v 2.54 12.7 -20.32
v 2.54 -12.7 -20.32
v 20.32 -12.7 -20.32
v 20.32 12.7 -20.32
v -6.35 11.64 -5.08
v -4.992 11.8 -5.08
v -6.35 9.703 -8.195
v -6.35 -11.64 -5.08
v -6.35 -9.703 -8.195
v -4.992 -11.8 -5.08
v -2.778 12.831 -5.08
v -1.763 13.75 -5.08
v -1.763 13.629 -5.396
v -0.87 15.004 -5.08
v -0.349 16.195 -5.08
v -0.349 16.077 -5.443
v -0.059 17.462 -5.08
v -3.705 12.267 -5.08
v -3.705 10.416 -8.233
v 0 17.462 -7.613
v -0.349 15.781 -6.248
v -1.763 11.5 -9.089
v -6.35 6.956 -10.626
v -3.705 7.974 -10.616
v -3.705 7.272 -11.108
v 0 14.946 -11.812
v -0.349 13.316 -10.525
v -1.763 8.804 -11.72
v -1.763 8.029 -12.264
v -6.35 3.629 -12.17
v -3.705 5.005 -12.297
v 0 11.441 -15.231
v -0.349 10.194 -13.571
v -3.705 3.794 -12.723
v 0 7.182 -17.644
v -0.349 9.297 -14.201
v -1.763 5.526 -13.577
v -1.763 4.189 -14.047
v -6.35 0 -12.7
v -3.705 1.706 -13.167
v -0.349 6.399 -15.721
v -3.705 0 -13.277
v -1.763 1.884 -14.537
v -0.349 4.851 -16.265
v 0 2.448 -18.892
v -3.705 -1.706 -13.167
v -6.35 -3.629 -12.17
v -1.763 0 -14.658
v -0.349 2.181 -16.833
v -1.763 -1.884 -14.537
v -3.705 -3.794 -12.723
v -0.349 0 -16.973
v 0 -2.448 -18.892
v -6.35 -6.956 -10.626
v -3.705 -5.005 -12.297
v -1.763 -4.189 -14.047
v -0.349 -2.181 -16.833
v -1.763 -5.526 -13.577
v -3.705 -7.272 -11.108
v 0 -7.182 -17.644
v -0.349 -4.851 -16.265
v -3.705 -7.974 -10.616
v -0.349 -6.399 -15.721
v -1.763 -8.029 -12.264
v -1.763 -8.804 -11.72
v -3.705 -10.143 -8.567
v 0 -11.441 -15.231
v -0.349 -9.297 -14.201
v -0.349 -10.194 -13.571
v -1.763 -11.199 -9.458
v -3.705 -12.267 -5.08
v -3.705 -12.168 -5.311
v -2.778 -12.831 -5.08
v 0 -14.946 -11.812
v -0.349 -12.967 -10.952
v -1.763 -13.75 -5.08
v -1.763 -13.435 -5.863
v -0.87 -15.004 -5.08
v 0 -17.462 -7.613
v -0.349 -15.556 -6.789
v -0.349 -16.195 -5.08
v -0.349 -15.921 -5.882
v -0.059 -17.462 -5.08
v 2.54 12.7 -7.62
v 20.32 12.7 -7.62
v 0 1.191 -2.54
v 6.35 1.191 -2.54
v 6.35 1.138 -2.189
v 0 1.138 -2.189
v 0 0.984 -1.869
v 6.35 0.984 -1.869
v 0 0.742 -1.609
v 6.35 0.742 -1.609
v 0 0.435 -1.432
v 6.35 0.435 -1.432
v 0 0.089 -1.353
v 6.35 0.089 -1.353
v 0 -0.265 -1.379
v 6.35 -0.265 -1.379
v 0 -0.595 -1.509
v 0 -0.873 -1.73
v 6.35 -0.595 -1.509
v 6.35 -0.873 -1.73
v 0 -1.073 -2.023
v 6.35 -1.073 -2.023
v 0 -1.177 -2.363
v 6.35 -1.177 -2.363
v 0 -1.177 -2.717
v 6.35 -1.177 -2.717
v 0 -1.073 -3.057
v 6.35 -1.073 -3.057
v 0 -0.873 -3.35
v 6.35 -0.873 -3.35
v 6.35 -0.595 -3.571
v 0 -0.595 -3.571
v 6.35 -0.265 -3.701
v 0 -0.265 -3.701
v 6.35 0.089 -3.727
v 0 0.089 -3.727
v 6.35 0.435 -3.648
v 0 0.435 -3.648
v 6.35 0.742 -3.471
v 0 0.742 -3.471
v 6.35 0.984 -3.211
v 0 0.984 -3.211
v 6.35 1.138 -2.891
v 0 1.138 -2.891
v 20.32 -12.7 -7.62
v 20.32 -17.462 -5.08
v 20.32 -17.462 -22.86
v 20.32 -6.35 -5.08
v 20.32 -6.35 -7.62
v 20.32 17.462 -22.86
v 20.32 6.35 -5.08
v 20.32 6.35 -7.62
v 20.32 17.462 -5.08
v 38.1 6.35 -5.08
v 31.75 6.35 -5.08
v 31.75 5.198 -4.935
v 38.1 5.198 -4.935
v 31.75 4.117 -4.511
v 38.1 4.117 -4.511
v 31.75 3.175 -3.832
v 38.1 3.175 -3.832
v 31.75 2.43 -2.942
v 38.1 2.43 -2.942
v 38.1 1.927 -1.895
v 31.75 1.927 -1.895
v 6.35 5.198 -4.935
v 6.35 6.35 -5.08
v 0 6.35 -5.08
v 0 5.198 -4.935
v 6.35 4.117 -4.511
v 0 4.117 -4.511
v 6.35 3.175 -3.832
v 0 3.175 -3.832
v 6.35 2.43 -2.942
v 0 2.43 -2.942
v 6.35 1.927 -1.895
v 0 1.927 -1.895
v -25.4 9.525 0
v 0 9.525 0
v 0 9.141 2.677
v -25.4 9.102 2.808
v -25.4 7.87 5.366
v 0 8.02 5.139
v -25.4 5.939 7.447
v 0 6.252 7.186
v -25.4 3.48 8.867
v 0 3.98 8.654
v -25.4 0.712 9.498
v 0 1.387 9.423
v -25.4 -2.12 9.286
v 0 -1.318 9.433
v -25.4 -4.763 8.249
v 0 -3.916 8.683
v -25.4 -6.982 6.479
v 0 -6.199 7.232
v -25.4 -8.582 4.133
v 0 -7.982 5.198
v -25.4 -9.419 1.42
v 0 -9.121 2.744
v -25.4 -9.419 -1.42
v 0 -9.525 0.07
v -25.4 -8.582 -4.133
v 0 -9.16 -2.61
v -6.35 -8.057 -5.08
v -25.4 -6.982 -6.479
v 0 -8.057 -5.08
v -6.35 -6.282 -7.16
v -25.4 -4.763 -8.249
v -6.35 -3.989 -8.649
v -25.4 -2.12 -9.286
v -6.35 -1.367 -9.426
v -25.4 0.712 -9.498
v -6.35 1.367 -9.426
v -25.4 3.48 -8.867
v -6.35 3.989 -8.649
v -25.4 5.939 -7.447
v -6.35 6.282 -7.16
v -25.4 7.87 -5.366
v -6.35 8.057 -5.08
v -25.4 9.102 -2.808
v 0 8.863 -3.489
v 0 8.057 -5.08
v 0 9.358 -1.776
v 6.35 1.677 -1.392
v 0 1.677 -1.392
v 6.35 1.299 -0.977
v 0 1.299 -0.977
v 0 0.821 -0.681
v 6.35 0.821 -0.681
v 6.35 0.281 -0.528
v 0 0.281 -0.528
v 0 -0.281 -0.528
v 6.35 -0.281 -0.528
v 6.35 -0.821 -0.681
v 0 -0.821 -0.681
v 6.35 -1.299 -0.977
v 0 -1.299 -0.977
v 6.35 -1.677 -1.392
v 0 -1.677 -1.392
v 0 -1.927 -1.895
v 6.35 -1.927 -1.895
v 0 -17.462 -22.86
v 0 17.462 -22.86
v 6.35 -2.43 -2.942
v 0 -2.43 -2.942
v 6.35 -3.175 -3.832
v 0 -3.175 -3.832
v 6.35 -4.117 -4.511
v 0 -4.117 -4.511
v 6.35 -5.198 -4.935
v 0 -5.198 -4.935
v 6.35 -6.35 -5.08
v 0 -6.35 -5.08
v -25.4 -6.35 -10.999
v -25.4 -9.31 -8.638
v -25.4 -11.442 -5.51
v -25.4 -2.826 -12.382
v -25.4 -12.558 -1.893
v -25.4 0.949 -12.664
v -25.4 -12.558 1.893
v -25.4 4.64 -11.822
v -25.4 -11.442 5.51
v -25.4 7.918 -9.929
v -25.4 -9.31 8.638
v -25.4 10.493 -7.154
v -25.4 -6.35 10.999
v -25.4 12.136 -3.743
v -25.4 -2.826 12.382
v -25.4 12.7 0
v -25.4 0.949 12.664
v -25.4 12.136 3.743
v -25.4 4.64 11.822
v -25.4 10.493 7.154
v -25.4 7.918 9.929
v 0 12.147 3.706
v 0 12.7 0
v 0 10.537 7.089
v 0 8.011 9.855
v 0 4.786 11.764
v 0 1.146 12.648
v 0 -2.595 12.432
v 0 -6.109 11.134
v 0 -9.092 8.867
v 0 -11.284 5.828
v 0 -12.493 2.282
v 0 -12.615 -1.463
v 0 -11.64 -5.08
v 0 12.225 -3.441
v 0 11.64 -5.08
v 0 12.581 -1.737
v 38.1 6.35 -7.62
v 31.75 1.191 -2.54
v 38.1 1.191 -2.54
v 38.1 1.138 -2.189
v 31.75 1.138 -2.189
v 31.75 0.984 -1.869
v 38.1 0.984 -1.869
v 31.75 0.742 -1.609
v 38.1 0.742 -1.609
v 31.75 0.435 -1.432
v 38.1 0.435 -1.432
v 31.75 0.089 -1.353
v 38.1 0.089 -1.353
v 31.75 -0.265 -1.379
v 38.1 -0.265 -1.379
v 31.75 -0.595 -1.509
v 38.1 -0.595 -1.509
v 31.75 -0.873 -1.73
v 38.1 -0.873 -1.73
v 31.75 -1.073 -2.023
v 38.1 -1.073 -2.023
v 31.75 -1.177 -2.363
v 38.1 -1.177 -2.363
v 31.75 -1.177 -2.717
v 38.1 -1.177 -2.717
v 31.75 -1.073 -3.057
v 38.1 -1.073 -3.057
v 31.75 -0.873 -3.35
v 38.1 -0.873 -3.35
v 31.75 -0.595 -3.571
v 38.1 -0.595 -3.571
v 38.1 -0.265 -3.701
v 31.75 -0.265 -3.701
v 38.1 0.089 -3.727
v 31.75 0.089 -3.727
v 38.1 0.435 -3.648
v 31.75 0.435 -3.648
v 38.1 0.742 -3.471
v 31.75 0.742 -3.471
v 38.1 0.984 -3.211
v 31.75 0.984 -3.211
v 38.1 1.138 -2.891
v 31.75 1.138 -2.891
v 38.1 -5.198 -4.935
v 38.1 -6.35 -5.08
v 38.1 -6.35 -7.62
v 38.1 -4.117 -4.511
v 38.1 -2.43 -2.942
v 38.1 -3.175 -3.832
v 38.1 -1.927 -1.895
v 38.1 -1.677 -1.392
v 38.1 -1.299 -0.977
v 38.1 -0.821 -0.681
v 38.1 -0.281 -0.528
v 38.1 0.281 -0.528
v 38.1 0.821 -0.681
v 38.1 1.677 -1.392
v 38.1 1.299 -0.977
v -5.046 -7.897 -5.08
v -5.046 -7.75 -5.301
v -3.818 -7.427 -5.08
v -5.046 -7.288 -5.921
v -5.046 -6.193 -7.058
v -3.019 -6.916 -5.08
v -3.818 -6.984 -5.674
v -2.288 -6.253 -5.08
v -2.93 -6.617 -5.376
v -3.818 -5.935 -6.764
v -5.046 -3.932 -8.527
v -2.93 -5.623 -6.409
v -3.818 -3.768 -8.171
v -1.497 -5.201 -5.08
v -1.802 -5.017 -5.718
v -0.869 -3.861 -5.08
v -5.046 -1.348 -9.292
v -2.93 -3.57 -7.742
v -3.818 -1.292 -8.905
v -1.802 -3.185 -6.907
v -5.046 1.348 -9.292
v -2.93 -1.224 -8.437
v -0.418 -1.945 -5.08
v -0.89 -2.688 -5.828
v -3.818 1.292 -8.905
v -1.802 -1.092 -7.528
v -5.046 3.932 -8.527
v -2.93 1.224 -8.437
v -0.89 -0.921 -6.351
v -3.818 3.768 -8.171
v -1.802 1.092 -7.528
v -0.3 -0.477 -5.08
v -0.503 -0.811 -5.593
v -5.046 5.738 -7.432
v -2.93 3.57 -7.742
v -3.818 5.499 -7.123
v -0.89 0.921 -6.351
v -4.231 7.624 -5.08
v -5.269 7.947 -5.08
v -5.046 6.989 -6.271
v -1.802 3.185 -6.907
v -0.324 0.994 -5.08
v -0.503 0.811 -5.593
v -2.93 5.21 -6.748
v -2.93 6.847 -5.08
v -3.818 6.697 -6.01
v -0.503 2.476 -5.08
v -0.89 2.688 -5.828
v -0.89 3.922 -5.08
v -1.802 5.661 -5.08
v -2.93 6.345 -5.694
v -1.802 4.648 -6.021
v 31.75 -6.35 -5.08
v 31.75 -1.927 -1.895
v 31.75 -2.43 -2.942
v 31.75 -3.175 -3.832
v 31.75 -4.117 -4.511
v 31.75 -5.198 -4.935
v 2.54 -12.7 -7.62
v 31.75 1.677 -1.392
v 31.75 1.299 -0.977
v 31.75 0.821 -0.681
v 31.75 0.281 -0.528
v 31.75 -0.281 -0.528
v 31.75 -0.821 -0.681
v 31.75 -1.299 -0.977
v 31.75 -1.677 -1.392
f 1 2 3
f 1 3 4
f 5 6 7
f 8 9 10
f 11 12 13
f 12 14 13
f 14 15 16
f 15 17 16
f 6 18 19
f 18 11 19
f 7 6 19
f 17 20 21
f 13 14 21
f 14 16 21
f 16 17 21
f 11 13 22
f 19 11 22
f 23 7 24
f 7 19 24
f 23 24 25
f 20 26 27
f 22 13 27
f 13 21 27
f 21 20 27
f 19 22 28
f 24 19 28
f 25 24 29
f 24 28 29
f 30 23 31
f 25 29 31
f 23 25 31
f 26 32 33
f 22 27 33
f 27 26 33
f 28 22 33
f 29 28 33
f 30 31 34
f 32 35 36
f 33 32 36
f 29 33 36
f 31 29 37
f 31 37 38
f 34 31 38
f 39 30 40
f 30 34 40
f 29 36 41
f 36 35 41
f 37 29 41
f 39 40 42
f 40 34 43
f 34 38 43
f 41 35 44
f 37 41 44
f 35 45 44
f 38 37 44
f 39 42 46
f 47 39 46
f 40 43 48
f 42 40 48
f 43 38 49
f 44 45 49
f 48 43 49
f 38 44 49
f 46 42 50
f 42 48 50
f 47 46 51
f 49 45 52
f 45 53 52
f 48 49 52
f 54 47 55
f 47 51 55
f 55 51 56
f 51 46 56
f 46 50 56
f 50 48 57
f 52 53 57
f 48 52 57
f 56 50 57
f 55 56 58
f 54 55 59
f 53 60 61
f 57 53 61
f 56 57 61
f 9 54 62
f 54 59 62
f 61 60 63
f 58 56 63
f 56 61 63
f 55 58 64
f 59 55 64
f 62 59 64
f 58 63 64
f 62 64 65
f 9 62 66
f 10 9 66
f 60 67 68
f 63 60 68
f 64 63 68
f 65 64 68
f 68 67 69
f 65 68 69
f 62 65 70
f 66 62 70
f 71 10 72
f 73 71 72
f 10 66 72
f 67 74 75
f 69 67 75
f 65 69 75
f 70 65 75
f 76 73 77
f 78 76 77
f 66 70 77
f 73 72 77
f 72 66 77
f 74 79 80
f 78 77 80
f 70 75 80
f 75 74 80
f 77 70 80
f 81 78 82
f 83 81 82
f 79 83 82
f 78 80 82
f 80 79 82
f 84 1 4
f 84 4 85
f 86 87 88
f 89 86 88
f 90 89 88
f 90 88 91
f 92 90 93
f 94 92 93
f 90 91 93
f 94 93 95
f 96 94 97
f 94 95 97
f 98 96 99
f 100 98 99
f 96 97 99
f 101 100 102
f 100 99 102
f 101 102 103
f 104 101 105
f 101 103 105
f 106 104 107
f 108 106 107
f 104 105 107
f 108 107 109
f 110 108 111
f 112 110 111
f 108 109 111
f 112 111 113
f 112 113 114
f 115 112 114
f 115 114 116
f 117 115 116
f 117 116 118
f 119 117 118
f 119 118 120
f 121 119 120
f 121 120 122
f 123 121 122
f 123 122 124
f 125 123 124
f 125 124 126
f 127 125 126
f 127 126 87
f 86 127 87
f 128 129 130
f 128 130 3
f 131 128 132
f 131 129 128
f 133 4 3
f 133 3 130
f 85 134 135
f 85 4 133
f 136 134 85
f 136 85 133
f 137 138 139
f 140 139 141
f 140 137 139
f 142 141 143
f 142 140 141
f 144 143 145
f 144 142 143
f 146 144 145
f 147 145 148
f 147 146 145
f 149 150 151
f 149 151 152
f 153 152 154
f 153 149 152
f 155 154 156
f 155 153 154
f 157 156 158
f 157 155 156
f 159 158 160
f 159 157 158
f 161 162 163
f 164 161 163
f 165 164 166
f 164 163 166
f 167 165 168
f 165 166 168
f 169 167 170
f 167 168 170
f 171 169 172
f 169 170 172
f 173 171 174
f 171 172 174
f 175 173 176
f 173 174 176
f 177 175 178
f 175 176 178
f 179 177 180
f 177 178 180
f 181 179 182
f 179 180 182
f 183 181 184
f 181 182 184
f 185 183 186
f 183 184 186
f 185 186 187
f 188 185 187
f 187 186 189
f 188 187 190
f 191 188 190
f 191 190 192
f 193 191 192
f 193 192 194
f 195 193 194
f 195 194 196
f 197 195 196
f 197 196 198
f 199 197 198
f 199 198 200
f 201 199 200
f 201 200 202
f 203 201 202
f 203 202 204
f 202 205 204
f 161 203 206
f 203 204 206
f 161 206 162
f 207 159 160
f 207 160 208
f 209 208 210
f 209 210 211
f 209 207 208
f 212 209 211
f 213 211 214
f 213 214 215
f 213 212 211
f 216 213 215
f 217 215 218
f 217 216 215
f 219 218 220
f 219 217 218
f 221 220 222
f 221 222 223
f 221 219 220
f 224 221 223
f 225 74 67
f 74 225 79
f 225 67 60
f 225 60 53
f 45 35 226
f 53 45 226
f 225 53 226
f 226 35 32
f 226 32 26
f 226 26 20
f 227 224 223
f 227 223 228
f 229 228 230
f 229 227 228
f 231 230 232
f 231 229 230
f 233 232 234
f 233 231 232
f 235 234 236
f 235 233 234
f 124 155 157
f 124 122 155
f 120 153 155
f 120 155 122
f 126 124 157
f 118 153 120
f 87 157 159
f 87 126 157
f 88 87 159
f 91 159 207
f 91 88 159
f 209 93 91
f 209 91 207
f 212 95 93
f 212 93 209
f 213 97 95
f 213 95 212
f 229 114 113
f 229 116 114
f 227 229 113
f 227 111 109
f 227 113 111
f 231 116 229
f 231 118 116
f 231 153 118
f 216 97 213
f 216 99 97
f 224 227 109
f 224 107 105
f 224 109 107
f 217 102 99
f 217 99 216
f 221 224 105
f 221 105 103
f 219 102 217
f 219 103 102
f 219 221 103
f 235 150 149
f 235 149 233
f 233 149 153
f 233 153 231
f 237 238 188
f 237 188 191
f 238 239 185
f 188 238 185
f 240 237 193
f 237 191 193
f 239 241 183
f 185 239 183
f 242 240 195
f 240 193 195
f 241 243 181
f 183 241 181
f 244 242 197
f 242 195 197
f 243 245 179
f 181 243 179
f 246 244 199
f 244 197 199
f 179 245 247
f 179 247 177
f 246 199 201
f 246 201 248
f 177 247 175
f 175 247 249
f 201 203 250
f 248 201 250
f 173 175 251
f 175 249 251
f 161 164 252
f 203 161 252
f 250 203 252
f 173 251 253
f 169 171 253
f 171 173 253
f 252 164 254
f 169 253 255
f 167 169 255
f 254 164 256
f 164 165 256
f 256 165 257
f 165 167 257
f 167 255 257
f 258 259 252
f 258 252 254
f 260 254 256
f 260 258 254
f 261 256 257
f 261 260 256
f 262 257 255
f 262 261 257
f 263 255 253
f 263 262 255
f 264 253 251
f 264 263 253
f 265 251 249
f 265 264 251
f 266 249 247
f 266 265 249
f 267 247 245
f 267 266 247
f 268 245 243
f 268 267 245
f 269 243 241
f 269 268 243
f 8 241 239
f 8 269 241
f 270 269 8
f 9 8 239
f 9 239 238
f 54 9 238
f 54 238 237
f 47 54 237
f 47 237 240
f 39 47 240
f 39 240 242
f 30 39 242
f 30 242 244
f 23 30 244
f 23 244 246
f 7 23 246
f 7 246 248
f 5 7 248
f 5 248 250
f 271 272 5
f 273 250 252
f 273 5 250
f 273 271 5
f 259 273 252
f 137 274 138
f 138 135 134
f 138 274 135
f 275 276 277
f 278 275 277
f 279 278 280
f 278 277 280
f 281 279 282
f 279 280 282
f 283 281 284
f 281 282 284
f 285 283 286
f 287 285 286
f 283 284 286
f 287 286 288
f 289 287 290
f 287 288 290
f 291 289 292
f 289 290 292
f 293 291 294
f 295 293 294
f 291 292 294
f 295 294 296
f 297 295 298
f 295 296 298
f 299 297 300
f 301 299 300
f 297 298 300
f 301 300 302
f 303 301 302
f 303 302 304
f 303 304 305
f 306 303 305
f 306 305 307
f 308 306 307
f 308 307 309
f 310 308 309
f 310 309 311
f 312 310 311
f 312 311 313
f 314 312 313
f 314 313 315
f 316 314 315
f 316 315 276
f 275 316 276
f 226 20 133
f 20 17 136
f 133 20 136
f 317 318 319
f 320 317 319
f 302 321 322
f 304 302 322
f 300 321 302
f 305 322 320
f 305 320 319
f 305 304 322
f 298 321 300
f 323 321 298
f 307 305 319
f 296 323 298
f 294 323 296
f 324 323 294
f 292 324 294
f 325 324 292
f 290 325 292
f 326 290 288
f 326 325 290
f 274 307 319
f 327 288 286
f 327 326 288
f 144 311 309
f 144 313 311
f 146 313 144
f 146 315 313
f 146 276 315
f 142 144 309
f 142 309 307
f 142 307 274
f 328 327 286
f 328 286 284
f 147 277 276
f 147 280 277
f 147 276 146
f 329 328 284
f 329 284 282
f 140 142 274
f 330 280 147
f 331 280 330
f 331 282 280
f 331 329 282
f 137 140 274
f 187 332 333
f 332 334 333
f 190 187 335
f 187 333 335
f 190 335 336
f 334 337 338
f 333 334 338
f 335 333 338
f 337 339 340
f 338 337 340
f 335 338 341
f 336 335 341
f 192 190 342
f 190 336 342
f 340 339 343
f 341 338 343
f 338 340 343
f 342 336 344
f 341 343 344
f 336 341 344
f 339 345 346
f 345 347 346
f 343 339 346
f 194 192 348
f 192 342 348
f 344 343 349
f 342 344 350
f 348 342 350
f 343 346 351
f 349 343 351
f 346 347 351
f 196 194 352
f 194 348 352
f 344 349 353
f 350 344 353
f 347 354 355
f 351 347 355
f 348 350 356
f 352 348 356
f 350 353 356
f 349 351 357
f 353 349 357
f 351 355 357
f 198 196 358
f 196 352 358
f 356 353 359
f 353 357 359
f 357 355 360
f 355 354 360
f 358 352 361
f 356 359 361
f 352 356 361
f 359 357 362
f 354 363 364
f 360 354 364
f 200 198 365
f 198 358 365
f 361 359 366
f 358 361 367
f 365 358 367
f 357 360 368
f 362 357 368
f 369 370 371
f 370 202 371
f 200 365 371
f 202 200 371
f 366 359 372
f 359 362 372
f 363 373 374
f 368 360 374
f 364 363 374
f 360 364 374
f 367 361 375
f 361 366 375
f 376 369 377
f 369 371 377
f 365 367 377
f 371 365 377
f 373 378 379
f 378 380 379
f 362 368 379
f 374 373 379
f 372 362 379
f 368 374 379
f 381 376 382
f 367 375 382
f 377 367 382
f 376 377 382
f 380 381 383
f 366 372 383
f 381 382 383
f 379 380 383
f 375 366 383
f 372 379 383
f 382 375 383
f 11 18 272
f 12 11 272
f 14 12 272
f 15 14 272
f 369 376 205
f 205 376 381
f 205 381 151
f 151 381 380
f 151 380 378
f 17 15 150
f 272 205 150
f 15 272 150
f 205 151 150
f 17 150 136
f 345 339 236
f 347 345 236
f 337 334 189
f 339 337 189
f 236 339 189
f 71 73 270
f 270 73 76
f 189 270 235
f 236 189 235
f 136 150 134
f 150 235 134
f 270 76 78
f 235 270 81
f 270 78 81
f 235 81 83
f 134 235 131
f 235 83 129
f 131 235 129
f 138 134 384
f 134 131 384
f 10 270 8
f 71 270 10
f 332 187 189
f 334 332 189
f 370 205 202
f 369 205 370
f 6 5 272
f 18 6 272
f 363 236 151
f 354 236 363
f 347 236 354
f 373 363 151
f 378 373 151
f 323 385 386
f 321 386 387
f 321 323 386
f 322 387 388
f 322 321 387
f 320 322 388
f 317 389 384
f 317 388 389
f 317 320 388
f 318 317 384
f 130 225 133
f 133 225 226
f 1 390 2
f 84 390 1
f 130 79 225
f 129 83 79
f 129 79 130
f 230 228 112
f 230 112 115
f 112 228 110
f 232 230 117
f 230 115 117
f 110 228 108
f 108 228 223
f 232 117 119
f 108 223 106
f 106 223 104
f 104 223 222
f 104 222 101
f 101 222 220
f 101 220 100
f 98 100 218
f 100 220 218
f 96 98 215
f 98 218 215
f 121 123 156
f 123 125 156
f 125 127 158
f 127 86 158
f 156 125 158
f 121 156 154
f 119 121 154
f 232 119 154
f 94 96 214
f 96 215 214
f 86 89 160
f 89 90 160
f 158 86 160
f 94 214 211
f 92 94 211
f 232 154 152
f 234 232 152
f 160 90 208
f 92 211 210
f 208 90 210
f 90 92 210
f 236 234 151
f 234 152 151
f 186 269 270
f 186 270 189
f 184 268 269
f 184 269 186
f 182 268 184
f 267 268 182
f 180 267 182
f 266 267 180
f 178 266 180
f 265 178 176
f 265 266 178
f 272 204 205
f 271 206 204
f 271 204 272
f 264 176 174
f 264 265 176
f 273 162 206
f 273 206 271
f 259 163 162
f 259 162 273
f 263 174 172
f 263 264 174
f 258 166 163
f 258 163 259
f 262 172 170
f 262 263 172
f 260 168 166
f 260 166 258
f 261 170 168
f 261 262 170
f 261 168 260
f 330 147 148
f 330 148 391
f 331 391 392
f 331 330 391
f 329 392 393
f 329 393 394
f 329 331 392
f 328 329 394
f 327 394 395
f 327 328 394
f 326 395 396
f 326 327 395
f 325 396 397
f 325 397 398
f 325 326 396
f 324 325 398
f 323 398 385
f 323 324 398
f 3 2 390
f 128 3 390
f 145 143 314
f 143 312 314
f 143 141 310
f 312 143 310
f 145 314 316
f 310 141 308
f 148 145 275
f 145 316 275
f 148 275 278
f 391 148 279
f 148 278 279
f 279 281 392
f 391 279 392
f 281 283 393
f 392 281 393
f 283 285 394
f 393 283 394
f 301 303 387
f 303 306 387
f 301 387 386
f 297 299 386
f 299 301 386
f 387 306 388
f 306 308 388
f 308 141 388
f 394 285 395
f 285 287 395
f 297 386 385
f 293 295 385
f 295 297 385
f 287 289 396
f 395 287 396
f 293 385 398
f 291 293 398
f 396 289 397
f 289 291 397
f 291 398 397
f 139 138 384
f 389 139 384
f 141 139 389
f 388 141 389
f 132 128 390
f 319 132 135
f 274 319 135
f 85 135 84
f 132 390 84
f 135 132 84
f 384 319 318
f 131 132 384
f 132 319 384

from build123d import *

# Parameters (mm, degrees)
F0_R        = 12.7
F0_R_2      = 9.525
F1_DEPTH    = 25.4
F2_W        = 34.925
F2_H        = 17.78
F2_W_2      = 25.4
F2_H_2      = 12.7
F3_DEPTH    = 2.54
F4_DEPTH    = 20.32
F5_T4_ANGLE = 306.6504874214
F5_T9_ANGLE = 276.2084965167
F6_W        = 12.7
F6_H        = 2.54
F7_DEPTH    = 17.78
F8_R        = 1.190625
F9_DEPTH    = 38.1
F10_W       = 25.4
F10_H       = 5.08
F11_DEPTH   = 12.7


# Not quite as in the source:
# - a fillet or chamfer that OpenCascade refuses, or shapes differently, is made with other operations: its cross-section is extruded or revolved along the edge and cut away or added


with BuildPart() as f1:
    # F0 (on Right) → F1 (new body)
    with BuildSketch(Plane.YZ):
        Circle(F0_R)
        Circle(F0_R_2, mode=Mode.SUBTRACT)
    extrude(amount=-F1_DEPTH)

    # F2 (on Right) → F3 (join)
    with BuildSketch(Plane.YZ):
        with Locations((0, -13.97)):
            Rectangle(F2_W, F2_H)
        with Locations((0, -13.97)):
            Rectangle(F2_W_2, F2_H_2, mode=Mode.SUBTRACT)
        with Locations((0, -13.97)):
            Rectangle(F2_W_2, F2_H_2)
    extrude(amount=F3_DEPTH)

    # F2 (on Right) → F4 (join)
    with BuildSketch(Plane.YZ):
        with Locations((0, -13.97)):
            Rectangle(F2_W, F2_H)
        with Locations((0, -13.97)):
            Rectangle(F2_W_2, F2_H_2, mode=Mode.SUBTRACT)
    extrude(amount=F4_DEPTH)

    # F5: fillet of radius 6.35 on 2 edges, made by hand


with BuildPart() as f5_tool2:
    # F5_s3 → F5_t4 (revolve)
    with BuildSketch(Plane(origin=(0, 0, 0), x_dir=(1, 0, 0), z_dir=(0, 0.8935692652, 0.4489253482))):
        with BuildLine():
            ThreePointArc((-6.35, -9.525), (-1.8598719395, -7.6651280605), (0, -3.175))
            Line((0, -3.175), (0, -9.525))
            Line((0, -9.525), (-6.35, -9.525))
        make_face()
    revolve(axis=Axis((0, 0, 0), (1, 0, 0)), revolution_arc=F5_T4_ANGLE)

    split(bisect_by=Plane.XY.offset(-5.08), keep=Keep.BOTTOM)


with BuildPart() as f1_1:
    add(f1.part)

    # F5_t1: union F5_tool2
    add(f5_tool2.part)


with BuildPart() as f5_tool7:
    # F5_s8 → F5_t9 (revolve)
    with BuildSketch(Plane(origin=(0, 0, 0), x_dir=(1, 0, 0), z_dir=(0, -0.7443610614, 0.6677773658))):
        with BuildLine():
            ThreePointArc((-6.35, 12.7), (-1.8598719395, 14.5598719395), (0, 19.05))
            Line((0, 19.05), (0, 12.7))
            Line((0, 12.7), (-6.35, 12.7))
        make_face()
    revolve(axis=Axis((0, 0, 0), (-1, 0, 0)), revolution_arc=F5_T9_ANGLE)

    split(bisect_by=Plane.XY.offset(-5.08), keep=Keep.BOTTOM)

    split(bisect_by=Plane.XZ.offset(17.4625), keep=Keep.BOTTOM)

    split(bisect_by=Plane.XZ.offset(-17.4625), keep=Keep.TOP)


with BuildPart() as f1_2:
    add(f1_1.part)

    # F5_t6: union F5_tool7
    add(f5_tool7.part)

    # F6 (on face) → F7 (join)
    with BuildSketch(Plane.YZ.offset(20.32)):
        with Locations((0, -6.35)):
            Rectangle(F6_W, F6_H)
    extrude(amount=F7_DEPTH)

    # F8 (on face) → F9 (join)
    with BuildSketch(Plane.YZ.offset(38.1)):
        with BuildLine():
            ThreePointArc((1.927081138, -1.8954984194), (0, -0.508), (-1.927081138, -1.8954984194))
            ThreePointArc((-1.927081138, -1.8954984194), (-3.6249650655, -4.2010485201), (-6.35, -5.08))
            Line((-6.35, -5.08), (6.35, -5.08))
            ThreePointArc((6.35, -5.08), (3.6249650655, -4.2010485201), (1.927081138, -1.8954984194))
        make_face()
        with Locations((0, -2.54)):
            Circle(F8_R, mode=Mode.SUBTRACT)
    extrude(amount=-F9_DEPTH)

    # F10 (on Front) → F11 (cut, symmetric)
    with BuildSketch(Plane.XZ):
        with Locations((19.05, -2.54)):
            Rectangle(F10_W, F10_H)
    extrude(amount=F11_DEPTH, both=True, mode=Mode.SUBTRACT)


solid = f1_2.part
